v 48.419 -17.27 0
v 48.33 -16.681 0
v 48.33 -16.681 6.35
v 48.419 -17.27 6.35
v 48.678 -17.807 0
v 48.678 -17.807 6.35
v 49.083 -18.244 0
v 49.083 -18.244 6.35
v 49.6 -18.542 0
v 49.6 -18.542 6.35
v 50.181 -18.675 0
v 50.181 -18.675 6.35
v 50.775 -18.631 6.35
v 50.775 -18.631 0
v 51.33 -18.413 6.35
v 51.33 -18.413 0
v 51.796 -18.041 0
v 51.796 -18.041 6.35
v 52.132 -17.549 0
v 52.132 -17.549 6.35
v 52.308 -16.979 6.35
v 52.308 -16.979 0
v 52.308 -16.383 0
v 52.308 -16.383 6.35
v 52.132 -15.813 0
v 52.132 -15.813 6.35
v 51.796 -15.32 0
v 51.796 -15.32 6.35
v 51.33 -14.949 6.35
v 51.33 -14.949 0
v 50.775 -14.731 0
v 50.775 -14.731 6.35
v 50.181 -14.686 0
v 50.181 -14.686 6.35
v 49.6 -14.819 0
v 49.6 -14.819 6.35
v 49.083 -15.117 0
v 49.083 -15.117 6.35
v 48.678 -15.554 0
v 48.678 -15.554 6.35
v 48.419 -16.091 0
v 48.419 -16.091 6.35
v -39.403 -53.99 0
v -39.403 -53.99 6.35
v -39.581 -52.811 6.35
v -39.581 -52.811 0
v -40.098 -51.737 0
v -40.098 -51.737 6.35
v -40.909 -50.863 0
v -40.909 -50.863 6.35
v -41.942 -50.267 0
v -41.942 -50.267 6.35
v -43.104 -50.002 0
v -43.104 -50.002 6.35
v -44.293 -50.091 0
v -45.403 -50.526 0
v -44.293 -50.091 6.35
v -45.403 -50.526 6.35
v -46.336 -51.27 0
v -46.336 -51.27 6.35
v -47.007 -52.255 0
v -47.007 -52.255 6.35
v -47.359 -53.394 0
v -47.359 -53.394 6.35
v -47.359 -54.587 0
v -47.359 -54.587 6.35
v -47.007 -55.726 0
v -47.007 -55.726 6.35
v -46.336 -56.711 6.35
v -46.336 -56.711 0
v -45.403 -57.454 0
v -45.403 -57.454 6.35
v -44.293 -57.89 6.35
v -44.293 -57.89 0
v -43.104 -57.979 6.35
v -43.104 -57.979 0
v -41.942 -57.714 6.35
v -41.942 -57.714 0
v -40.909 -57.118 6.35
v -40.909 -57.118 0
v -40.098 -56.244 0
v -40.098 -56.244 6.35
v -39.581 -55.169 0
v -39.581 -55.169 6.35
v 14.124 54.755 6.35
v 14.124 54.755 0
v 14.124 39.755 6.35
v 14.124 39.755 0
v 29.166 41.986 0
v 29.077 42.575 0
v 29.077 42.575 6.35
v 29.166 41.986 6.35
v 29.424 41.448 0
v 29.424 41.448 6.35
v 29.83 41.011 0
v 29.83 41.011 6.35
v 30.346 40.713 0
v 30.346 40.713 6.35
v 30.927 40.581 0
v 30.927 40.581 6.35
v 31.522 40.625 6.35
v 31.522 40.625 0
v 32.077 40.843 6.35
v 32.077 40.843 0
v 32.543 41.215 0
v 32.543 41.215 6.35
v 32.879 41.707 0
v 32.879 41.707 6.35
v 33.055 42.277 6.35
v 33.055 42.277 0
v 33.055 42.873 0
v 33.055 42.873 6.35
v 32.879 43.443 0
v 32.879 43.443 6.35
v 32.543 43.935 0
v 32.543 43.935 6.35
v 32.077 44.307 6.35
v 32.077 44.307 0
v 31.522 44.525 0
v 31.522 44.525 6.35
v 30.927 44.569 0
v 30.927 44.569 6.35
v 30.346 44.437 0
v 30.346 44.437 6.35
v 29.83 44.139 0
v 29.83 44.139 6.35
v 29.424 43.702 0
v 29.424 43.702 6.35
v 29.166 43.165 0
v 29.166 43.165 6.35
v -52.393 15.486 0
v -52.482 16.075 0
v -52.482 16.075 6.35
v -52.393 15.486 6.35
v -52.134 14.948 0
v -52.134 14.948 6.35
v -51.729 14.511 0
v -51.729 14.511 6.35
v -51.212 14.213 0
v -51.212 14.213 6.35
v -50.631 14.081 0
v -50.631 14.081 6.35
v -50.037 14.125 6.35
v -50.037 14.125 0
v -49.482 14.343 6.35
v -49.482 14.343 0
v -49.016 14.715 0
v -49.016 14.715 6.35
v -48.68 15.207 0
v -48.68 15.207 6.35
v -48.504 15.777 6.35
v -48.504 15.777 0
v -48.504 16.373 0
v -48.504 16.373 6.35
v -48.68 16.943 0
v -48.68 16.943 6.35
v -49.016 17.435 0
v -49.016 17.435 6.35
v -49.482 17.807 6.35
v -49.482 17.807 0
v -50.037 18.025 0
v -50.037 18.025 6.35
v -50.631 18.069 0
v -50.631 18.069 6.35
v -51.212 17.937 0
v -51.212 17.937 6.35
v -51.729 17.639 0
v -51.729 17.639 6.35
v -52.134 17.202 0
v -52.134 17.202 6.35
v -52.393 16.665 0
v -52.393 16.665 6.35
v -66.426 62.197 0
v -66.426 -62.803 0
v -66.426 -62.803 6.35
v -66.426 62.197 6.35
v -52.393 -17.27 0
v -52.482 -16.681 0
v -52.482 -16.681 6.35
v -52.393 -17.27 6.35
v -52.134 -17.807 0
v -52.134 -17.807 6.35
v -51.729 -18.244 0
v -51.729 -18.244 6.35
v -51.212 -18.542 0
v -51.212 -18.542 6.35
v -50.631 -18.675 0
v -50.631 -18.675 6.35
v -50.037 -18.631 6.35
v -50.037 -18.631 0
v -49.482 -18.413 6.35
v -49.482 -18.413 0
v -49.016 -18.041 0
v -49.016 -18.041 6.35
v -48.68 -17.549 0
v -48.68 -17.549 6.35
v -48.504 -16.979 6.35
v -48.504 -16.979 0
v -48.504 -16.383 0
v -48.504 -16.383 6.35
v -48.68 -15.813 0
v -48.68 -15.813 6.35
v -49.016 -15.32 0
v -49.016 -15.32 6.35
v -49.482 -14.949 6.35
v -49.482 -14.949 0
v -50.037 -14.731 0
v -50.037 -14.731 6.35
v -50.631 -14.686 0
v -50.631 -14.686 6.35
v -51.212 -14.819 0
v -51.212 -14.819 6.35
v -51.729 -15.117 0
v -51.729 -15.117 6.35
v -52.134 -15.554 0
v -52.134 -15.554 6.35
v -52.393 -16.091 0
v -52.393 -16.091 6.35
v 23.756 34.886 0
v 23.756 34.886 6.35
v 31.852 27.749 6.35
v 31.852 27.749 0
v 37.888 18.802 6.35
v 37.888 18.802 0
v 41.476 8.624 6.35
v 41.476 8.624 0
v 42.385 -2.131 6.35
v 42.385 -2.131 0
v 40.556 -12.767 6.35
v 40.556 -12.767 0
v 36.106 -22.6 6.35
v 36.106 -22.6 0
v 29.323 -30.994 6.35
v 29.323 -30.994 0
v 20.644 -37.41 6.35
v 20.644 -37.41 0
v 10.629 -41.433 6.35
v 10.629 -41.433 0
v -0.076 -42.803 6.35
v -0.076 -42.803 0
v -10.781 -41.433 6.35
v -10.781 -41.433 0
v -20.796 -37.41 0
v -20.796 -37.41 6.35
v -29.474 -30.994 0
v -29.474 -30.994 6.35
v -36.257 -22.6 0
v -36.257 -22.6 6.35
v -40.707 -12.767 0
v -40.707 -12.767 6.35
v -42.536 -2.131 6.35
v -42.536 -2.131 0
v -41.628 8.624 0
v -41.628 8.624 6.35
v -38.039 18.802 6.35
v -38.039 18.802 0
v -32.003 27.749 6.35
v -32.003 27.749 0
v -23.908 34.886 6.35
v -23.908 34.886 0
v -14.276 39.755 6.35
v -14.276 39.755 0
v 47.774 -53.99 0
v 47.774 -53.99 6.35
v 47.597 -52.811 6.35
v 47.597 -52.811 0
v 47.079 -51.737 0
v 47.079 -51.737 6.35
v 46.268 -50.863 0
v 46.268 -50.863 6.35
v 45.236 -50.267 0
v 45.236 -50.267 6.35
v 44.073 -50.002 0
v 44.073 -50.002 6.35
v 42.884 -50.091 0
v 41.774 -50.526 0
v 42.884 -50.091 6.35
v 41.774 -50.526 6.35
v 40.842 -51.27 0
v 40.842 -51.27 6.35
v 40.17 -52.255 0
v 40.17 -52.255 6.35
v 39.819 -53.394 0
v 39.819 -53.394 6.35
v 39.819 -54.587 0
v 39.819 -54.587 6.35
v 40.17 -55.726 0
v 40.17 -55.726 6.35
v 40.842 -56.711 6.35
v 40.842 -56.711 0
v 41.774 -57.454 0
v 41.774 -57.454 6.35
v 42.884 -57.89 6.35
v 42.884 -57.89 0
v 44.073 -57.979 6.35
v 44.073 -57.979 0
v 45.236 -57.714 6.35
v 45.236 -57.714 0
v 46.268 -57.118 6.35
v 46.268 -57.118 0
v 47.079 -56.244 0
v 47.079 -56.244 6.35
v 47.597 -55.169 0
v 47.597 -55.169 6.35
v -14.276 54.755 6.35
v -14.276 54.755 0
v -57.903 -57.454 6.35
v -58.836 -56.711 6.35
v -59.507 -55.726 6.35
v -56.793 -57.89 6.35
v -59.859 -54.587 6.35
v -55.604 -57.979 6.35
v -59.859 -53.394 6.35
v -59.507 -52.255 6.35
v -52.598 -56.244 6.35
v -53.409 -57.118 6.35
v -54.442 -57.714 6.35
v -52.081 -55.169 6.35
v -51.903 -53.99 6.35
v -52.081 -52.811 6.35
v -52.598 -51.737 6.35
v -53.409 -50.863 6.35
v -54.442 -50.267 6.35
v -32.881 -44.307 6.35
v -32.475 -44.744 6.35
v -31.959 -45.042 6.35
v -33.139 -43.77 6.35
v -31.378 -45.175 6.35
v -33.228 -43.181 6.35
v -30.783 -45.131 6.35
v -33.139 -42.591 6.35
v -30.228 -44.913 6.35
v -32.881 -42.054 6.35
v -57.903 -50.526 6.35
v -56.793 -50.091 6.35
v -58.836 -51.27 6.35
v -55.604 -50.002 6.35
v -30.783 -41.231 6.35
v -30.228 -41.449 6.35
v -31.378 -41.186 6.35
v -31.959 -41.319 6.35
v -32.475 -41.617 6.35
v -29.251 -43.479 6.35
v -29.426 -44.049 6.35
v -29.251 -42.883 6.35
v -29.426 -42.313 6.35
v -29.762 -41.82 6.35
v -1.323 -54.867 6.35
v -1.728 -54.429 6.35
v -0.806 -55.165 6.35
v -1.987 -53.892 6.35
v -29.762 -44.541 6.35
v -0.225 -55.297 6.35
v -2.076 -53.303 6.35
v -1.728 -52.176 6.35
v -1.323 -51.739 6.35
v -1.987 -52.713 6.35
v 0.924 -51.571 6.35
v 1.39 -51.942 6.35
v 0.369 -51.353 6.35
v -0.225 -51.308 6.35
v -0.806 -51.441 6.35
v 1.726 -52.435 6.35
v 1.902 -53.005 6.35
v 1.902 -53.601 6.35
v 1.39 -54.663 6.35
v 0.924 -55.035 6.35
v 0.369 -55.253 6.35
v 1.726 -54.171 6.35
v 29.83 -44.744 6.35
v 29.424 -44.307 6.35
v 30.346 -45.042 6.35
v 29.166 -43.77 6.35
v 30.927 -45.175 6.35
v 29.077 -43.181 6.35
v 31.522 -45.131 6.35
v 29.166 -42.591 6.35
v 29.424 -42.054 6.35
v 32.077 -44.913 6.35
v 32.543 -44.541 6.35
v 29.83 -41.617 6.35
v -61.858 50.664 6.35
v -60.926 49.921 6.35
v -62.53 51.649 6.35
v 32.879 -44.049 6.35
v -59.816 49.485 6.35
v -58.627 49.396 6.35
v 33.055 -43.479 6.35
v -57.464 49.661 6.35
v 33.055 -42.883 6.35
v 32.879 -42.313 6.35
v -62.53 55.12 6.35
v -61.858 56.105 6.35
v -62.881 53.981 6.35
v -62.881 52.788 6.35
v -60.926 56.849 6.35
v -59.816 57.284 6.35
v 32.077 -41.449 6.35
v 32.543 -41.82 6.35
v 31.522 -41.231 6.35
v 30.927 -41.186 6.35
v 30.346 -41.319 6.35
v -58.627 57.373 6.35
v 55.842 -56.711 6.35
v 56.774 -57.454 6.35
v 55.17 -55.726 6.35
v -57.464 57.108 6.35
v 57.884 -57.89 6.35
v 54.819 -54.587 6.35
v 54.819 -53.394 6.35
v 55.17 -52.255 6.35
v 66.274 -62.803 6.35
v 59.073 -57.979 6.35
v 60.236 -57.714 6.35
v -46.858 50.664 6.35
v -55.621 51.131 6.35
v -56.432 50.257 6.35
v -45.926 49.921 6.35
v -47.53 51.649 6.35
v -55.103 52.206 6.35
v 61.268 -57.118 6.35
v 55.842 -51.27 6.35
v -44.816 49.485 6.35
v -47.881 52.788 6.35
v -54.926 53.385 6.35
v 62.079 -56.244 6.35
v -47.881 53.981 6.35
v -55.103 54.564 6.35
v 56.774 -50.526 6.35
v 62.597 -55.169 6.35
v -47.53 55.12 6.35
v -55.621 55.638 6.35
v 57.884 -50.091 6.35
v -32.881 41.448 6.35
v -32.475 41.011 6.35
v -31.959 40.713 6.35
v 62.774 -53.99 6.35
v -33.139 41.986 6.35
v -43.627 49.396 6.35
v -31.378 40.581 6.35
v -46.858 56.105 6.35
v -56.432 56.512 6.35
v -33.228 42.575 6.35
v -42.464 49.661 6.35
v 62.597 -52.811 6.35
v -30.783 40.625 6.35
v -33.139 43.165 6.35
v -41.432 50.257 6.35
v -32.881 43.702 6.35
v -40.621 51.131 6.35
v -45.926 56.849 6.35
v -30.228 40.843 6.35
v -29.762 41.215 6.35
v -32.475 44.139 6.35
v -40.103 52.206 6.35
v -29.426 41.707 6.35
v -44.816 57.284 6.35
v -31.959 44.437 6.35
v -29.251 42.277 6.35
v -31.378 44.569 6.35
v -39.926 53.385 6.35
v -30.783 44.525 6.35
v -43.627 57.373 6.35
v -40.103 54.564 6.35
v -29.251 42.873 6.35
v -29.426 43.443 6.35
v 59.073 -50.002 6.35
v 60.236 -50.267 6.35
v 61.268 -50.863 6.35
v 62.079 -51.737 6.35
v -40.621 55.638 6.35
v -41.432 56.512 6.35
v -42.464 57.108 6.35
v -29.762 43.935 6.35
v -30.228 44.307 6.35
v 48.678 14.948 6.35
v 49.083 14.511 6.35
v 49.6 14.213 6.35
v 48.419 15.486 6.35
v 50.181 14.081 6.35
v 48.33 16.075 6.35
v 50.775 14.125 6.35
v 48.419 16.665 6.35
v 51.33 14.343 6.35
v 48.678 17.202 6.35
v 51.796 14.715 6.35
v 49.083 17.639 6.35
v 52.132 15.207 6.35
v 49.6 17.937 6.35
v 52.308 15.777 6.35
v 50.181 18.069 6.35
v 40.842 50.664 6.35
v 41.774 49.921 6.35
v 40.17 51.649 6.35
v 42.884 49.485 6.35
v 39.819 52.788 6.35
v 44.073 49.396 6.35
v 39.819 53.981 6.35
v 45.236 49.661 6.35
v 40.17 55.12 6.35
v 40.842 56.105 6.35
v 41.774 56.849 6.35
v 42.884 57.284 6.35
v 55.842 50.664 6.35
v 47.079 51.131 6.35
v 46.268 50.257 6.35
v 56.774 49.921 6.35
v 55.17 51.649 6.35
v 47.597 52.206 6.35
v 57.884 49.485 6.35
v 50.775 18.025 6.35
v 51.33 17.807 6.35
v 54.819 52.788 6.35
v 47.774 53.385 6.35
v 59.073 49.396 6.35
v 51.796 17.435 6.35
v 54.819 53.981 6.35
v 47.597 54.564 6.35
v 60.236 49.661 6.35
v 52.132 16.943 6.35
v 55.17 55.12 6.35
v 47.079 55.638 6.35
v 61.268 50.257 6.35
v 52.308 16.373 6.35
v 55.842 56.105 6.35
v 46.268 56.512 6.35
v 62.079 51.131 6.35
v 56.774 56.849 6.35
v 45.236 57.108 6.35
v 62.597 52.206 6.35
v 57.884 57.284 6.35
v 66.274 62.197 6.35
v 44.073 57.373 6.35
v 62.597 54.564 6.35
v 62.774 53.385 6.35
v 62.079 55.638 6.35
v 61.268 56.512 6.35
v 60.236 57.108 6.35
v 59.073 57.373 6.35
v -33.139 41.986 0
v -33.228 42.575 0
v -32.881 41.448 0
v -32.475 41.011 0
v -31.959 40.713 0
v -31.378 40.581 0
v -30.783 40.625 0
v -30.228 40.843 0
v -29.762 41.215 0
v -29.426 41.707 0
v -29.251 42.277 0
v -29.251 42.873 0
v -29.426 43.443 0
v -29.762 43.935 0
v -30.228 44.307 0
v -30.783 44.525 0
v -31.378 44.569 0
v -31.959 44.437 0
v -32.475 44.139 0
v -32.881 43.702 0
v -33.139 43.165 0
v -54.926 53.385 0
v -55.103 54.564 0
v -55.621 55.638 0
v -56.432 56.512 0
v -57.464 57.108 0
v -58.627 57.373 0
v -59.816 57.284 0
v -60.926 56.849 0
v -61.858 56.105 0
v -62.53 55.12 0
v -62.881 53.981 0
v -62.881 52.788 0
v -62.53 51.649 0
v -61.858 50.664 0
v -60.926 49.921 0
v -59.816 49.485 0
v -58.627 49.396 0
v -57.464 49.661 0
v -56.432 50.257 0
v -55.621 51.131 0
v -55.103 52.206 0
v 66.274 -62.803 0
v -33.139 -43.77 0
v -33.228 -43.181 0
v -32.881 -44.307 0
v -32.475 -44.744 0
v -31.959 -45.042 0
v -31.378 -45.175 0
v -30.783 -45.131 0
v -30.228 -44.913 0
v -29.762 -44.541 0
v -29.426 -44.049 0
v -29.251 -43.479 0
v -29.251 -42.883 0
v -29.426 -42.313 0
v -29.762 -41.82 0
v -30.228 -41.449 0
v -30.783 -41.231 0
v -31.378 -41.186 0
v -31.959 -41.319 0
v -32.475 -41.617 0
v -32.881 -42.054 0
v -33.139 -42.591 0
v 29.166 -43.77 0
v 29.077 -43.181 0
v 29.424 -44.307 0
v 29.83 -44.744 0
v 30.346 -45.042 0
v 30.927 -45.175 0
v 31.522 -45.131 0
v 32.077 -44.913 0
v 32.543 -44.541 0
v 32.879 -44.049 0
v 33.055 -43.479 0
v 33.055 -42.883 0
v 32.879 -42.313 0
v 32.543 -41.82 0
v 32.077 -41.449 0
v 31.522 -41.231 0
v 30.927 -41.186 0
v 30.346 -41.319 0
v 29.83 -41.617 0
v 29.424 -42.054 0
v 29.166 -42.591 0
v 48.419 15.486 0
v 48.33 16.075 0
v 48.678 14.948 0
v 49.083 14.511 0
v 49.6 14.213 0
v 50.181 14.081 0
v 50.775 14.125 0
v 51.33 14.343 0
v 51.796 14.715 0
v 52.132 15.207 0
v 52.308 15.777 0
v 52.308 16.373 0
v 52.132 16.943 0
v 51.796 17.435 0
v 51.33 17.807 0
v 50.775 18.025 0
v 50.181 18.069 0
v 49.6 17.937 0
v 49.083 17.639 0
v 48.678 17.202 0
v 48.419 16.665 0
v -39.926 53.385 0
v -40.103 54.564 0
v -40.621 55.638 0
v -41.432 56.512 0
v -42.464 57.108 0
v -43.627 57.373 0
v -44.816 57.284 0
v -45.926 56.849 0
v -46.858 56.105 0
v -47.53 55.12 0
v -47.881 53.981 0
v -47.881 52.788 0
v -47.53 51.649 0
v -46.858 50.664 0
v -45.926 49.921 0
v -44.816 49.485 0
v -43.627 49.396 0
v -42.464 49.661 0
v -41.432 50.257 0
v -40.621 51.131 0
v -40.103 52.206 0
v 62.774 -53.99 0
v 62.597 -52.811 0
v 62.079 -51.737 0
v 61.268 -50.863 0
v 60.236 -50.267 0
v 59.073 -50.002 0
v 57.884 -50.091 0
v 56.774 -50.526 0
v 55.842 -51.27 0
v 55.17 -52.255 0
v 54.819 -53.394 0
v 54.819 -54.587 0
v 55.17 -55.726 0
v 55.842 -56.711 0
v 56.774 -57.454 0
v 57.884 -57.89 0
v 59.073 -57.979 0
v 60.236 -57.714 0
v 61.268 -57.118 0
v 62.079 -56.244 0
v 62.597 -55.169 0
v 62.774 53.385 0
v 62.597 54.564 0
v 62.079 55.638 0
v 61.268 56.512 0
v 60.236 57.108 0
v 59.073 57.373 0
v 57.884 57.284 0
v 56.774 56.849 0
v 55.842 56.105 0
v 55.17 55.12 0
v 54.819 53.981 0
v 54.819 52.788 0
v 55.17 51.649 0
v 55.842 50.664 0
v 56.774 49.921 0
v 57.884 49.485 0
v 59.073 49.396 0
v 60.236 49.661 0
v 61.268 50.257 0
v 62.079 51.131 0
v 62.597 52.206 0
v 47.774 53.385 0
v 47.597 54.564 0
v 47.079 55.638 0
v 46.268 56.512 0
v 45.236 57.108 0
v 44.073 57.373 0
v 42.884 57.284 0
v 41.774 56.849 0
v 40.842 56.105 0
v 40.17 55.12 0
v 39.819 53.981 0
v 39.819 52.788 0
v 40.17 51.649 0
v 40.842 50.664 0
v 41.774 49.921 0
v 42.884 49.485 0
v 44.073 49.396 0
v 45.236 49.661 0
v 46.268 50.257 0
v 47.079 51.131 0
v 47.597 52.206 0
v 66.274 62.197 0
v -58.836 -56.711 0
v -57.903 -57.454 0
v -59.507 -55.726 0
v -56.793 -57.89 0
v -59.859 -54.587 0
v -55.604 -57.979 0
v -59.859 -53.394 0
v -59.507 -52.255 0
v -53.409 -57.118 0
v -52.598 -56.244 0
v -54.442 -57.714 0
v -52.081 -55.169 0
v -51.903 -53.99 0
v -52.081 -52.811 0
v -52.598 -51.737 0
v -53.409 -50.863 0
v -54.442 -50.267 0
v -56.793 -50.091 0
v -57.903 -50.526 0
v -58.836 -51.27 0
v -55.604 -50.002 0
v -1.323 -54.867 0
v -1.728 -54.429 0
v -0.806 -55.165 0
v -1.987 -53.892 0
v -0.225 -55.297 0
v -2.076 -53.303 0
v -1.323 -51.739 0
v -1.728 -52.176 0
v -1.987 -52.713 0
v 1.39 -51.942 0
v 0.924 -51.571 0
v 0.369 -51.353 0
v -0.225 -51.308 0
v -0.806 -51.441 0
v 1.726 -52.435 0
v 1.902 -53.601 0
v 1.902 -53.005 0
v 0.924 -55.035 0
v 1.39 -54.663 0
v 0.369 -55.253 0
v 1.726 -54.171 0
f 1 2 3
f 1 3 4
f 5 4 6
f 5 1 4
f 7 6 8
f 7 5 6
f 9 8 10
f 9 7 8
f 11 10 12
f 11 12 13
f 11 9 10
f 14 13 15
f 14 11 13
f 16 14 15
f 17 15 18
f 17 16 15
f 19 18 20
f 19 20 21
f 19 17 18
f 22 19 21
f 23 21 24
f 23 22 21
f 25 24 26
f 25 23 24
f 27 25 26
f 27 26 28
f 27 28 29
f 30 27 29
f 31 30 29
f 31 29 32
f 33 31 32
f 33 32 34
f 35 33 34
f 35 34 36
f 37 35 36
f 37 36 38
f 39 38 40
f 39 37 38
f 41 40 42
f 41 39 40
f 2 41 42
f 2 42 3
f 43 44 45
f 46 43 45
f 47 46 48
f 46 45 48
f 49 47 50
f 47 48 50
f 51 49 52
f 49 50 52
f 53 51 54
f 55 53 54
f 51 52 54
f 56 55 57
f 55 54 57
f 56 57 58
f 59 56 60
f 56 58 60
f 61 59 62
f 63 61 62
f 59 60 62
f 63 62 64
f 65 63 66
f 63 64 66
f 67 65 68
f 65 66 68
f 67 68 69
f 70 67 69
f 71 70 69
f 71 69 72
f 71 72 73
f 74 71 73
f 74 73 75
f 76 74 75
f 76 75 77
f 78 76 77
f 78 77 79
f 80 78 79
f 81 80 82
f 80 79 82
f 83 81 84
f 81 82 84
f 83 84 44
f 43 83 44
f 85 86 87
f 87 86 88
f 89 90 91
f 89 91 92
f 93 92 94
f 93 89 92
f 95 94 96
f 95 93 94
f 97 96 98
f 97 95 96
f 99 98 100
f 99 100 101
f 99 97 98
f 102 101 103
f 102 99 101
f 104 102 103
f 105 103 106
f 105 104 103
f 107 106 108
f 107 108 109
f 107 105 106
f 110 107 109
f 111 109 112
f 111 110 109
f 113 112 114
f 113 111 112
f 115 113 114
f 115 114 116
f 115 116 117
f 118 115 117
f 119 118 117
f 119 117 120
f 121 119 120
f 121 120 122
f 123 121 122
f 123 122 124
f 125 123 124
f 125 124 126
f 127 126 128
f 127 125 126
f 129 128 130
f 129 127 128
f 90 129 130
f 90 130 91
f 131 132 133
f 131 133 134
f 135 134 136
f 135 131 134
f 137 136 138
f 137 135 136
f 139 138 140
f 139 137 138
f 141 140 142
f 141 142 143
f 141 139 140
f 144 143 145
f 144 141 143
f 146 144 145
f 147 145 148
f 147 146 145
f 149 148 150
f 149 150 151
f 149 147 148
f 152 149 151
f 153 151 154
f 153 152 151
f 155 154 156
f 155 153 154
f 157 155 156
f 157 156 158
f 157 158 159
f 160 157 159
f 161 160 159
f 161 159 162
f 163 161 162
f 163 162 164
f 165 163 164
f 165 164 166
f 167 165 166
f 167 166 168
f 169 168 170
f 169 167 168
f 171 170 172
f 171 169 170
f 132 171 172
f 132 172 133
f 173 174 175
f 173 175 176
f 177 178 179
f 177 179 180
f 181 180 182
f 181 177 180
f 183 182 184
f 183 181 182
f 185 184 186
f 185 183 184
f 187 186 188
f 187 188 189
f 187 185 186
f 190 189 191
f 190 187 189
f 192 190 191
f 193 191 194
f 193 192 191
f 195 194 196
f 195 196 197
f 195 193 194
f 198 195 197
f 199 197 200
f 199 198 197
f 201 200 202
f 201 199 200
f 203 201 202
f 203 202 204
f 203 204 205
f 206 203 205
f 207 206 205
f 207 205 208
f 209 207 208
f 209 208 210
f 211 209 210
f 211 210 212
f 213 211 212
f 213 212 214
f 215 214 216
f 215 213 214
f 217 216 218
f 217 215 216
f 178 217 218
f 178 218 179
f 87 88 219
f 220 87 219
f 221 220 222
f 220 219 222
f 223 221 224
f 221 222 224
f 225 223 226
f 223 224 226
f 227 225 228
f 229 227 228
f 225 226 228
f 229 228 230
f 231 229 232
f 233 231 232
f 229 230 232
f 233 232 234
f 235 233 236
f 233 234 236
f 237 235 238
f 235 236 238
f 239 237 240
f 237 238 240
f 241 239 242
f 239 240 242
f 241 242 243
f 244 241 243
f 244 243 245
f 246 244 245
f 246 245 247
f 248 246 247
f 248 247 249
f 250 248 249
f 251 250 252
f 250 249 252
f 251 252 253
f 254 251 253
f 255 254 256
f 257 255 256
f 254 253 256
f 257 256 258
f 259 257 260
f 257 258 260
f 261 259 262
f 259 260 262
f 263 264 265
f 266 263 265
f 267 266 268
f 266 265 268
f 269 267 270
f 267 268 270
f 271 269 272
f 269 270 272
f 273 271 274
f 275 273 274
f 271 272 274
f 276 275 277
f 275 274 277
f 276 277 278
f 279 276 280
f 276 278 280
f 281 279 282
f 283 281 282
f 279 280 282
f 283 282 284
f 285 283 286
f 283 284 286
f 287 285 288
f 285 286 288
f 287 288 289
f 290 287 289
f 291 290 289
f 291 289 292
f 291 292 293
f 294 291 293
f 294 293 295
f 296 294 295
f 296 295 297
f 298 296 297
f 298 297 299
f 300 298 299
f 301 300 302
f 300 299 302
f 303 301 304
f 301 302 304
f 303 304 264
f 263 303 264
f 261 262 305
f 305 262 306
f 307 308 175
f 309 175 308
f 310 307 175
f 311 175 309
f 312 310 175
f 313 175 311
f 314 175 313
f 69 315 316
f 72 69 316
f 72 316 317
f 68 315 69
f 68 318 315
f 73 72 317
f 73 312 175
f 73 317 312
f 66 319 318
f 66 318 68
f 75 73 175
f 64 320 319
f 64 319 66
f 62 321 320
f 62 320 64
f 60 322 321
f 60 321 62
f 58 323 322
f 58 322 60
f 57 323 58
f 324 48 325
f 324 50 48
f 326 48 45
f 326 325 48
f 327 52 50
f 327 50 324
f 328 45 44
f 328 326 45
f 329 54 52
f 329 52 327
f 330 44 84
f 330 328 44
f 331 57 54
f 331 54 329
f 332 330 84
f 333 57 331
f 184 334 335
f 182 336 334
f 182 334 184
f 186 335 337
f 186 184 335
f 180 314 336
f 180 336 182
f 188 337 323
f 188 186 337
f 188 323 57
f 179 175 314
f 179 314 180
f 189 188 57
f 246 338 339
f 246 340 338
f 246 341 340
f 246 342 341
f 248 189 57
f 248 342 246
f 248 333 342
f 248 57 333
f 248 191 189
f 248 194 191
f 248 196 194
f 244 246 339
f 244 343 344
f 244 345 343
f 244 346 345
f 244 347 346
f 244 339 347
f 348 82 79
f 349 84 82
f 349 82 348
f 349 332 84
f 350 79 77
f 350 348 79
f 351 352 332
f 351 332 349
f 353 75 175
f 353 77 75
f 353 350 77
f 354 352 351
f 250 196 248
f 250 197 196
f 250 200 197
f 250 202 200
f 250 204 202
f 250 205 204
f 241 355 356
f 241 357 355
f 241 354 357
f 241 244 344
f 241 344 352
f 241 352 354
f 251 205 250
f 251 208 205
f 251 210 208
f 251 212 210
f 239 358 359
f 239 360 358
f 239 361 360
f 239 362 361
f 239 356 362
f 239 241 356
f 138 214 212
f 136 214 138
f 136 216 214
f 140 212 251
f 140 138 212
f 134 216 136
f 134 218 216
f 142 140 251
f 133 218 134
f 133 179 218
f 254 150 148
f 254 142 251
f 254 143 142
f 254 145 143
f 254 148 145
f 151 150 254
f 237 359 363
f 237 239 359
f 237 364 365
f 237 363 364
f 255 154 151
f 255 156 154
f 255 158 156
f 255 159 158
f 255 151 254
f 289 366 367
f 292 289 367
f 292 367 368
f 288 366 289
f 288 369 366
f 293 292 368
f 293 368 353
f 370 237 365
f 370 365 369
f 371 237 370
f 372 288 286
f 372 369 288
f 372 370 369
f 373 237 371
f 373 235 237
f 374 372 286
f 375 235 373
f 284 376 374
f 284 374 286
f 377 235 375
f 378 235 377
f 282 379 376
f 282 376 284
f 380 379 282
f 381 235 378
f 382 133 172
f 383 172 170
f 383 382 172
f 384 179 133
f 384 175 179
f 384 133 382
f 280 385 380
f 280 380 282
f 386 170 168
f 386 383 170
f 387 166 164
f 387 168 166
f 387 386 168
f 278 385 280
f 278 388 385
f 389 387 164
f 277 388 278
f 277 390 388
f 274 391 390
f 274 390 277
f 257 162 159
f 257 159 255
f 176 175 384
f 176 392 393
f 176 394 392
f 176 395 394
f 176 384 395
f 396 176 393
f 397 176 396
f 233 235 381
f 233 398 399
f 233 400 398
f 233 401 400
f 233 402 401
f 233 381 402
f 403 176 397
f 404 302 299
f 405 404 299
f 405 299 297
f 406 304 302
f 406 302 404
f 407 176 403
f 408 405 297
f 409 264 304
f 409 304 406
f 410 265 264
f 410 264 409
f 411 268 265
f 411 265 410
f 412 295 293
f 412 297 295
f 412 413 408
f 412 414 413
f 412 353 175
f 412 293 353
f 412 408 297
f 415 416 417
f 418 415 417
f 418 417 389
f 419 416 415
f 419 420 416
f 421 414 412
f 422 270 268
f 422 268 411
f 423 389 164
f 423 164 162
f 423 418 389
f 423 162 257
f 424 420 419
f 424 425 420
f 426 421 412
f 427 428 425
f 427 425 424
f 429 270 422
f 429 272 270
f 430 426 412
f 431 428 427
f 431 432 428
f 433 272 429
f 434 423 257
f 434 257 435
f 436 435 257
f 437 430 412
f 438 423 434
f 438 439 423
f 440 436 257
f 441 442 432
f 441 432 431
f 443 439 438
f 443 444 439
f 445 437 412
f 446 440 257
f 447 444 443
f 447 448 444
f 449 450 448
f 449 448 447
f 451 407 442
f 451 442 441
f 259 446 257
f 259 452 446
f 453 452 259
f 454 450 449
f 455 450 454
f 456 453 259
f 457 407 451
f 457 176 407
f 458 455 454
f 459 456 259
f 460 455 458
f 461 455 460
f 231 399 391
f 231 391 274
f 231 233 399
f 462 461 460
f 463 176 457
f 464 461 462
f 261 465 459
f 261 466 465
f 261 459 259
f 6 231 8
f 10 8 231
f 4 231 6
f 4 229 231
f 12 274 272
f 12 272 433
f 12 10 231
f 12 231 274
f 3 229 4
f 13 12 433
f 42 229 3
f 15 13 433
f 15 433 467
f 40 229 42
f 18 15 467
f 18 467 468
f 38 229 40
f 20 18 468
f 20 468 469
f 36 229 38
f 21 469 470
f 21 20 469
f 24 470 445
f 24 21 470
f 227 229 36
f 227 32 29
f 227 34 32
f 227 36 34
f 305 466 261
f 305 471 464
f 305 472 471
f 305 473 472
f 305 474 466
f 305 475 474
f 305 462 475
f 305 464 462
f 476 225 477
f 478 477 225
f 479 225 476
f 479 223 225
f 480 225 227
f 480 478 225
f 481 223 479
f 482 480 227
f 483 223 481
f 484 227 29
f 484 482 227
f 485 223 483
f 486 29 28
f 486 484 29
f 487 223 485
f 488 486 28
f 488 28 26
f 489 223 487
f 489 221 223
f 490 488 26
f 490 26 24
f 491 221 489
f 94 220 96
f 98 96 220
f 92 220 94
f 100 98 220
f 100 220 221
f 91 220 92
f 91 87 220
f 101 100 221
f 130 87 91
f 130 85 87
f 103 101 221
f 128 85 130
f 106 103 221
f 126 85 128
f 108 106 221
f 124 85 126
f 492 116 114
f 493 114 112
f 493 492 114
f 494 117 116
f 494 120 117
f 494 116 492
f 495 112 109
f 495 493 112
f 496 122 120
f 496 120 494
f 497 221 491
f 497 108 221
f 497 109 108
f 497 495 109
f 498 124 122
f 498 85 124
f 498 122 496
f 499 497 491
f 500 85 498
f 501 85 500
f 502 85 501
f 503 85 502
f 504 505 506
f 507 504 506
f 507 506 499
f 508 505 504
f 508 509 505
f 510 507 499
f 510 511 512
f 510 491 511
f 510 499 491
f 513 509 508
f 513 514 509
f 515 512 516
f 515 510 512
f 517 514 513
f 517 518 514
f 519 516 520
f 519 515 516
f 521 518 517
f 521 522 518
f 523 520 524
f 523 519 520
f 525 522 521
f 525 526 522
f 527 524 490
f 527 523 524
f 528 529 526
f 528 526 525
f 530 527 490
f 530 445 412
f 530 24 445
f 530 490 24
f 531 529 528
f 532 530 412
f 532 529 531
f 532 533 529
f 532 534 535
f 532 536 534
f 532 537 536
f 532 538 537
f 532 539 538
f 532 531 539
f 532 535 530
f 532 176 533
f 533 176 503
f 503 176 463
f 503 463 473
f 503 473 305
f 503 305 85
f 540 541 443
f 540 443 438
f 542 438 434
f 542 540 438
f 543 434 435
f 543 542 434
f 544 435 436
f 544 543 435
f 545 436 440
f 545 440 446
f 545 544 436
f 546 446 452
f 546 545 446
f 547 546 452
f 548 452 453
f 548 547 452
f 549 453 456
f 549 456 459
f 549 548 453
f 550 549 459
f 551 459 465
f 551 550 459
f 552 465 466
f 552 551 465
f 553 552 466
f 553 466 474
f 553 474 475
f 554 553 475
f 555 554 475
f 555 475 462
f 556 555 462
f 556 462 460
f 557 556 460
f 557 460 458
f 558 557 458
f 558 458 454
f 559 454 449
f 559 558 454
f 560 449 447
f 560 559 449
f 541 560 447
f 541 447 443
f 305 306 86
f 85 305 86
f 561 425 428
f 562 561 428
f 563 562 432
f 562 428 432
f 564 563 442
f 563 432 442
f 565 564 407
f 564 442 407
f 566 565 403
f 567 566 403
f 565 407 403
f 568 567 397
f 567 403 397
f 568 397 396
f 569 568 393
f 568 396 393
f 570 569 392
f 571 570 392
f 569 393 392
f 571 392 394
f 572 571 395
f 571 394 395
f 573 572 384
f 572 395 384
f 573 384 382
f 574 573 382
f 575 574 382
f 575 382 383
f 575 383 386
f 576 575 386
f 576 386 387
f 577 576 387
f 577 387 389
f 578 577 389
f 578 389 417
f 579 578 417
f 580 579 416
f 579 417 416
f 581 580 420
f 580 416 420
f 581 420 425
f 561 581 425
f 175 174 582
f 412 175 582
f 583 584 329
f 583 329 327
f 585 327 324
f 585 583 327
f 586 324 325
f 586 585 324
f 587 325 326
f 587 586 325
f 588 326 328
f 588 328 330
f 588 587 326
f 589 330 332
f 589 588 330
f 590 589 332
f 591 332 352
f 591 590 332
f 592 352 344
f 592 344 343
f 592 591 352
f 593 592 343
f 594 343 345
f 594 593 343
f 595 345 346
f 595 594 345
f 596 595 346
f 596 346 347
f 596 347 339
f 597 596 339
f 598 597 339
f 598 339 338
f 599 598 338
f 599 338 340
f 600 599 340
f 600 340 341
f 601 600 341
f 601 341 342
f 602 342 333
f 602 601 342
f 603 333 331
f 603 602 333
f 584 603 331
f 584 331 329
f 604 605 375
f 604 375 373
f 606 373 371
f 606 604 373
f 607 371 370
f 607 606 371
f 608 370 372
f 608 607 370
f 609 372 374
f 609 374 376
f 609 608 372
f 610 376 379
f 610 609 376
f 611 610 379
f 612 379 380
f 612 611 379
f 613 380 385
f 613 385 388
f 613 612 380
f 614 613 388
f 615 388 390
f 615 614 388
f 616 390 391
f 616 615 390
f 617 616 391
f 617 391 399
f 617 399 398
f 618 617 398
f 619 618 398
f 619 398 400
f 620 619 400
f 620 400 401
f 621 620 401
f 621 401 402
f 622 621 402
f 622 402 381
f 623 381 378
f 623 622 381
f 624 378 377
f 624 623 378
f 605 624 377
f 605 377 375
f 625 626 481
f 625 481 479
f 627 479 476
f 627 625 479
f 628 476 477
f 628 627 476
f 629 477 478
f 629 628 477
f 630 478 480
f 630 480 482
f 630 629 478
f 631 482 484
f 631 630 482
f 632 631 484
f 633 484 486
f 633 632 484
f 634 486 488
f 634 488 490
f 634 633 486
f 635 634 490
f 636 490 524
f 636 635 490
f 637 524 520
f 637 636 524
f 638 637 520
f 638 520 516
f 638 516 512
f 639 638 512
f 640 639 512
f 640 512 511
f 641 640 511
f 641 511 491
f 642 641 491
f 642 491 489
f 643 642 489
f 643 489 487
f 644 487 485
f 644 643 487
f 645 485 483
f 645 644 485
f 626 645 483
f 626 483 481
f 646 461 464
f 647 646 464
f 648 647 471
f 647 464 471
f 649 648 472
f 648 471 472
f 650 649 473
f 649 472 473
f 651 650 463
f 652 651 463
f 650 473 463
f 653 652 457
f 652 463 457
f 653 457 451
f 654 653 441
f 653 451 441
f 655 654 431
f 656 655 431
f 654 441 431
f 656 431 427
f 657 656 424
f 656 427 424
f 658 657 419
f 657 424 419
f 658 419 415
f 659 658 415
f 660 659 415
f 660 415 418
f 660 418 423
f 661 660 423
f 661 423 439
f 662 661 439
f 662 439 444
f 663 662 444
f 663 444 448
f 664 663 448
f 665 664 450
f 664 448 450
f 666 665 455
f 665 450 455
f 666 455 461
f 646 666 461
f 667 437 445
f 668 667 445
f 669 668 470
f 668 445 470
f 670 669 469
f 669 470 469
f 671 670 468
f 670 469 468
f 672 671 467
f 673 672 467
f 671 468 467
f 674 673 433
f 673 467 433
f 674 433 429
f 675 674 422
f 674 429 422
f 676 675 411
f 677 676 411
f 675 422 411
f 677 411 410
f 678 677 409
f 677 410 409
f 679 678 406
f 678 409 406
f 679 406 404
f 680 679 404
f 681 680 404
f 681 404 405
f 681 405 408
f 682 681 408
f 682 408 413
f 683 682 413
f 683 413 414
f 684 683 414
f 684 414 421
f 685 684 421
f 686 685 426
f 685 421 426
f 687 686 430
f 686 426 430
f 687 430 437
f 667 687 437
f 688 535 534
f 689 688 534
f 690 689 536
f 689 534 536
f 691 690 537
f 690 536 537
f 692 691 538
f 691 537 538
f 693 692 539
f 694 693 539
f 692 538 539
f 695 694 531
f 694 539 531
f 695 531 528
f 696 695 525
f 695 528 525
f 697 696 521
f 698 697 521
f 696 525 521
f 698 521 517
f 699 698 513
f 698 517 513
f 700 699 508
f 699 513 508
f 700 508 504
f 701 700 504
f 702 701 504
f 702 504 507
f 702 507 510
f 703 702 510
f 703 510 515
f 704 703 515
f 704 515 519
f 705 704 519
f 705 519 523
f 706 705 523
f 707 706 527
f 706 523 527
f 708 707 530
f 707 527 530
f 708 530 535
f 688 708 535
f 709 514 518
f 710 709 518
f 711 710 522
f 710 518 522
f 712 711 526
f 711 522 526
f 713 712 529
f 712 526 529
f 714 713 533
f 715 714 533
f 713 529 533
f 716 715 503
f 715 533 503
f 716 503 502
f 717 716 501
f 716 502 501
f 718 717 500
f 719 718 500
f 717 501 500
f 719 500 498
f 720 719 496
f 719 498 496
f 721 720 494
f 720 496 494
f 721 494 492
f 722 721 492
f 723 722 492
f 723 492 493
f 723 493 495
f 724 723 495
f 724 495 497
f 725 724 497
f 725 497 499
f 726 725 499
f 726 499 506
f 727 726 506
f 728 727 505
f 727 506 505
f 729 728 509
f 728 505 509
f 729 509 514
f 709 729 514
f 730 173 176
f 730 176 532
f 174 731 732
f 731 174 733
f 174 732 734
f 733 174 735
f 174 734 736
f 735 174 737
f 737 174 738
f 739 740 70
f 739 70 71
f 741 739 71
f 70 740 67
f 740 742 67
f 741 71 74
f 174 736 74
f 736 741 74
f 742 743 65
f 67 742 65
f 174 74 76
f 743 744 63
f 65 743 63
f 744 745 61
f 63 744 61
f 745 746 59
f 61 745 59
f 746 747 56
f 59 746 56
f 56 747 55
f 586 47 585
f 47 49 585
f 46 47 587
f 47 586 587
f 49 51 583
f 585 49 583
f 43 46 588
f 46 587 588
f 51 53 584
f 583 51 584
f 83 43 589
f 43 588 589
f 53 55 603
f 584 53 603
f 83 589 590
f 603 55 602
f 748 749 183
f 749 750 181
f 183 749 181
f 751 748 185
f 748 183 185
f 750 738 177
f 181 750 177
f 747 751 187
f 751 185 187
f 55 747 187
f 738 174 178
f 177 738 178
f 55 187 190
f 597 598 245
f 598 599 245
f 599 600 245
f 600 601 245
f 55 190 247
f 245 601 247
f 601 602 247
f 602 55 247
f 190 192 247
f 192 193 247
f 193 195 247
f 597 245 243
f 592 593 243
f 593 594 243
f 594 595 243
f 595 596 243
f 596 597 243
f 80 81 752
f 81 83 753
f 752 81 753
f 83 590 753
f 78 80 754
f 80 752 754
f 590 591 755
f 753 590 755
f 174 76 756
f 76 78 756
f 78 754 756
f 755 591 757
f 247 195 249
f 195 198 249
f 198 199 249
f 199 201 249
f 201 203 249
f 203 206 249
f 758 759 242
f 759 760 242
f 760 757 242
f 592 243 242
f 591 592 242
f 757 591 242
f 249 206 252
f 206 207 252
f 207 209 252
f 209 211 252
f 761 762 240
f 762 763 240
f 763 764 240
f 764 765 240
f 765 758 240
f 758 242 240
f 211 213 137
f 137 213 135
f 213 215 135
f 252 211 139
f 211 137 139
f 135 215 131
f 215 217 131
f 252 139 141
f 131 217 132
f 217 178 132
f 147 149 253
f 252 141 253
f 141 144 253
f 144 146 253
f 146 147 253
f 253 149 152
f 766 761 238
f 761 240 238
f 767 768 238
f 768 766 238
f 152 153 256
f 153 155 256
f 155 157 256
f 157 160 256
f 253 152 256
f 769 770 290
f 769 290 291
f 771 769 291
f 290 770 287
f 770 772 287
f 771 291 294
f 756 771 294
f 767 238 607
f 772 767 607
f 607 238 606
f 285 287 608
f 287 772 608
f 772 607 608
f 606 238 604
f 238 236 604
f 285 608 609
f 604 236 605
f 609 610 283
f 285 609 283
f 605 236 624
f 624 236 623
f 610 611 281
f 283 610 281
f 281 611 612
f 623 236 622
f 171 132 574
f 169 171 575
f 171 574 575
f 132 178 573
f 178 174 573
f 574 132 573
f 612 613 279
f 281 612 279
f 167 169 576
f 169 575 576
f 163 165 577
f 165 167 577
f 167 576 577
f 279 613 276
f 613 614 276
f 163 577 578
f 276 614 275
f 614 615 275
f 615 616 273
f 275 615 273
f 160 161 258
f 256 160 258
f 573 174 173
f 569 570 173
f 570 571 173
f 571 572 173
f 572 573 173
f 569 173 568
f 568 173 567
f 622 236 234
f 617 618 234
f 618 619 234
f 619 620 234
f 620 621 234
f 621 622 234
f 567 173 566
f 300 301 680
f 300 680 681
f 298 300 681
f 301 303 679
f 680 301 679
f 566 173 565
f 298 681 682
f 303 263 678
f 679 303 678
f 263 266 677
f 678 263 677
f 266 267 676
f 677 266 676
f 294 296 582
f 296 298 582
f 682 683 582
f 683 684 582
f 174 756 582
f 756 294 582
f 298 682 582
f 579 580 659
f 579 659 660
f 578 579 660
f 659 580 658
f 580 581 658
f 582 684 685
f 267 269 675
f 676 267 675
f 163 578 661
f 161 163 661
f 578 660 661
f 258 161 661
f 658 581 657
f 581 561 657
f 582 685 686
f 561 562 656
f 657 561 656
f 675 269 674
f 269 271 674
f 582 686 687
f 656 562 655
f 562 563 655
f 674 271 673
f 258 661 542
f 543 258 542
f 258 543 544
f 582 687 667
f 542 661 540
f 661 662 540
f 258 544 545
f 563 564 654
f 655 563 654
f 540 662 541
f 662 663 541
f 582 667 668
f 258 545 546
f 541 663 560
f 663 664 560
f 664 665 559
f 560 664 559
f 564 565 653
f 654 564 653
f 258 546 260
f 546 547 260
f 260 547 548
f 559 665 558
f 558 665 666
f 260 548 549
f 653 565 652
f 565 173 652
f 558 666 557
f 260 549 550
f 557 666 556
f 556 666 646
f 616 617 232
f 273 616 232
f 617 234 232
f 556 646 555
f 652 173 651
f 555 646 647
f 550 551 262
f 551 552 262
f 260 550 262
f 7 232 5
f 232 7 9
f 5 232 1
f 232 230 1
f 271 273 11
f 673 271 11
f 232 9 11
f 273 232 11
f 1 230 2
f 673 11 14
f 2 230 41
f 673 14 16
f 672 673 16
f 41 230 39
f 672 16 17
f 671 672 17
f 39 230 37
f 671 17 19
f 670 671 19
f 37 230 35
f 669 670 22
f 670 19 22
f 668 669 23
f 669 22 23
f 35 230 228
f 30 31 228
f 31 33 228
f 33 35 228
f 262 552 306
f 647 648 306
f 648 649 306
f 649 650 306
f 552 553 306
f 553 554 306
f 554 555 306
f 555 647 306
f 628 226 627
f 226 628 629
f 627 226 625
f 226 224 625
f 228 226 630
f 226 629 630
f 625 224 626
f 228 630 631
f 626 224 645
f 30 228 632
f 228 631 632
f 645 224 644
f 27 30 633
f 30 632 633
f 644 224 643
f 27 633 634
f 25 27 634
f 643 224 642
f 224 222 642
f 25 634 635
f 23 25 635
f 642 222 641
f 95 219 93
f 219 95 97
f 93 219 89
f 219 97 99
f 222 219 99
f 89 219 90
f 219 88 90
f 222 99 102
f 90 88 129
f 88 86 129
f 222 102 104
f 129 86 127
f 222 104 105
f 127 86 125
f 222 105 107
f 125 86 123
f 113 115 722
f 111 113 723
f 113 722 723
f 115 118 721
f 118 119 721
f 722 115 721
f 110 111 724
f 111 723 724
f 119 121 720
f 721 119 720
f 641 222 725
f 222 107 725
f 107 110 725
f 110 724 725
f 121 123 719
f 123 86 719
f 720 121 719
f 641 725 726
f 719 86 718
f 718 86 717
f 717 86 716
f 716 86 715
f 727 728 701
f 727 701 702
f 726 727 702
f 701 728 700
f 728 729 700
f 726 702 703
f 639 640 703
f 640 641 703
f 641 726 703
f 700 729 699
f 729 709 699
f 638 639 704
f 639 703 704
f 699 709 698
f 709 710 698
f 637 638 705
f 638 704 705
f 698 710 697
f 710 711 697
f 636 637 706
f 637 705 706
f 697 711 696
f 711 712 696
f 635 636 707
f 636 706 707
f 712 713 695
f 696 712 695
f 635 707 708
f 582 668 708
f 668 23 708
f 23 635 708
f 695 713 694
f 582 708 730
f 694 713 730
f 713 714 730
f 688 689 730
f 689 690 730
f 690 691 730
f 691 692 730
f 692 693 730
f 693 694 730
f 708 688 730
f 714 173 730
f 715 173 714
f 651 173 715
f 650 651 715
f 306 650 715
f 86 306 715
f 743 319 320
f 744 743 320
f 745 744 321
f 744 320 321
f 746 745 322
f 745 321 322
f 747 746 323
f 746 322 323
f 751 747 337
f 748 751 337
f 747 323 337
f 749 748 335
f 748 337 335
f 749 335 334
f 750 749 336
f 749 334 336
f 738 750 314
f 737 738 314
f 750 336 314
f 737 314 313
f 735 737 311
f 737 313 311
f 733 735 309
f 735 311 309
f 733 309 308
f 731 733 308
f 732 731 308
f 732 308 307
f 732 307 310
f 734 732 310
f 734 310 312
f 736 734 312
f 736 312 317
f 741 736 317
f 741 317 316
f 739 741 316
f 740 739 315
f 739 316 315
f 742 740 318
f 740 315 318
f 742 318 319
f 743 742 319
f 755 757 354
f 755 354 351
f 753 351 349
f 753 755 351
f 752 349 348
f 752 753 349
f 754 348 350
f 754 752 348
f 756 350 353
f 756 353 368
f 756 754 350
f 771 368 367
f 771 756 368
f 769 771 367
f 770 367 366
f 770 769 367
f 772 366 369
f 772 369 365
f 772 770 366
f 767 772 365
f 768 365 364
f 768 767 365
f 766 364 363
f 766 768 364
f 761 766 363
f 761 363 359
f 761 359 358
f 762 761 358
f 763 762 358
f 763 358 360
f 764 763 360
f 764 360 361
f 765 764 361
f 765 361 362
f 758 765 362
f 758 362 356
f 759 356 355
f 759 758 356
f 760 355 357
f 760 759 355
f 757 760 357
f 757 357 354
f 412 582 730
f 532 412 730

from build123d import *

# Parameters (mm, degrees)
SKETCH2_W           = 132.7
SKETCH2_H           = 125
BOSS_EXTRUDE1_DEPTH = 6.35
SKETCH1_R           = 2
CUT_EXTRUDE1_DEPTH  = 6.35
SKETCH6_R           = 4
CUT_EXTRUDE3_DEPTH  = 6.35


with BuildPart() as part:
    # Sketch2 → Boss-Extrude1 (new body)
    with BuildSketch(Plane.XY):
        with Locations((-0.075710713, -0.302842853)):
            Rectangle(SKETCH2_W, SKETCH2_H)
    extrude(amount=BOSS_EXTRUDE1_DEPTH)

    # Sketch1 → Cut-Extrude1 (cut)
    with BuildSketch(Plane.XY):
        with Locations(Location((-50.481706077, 16.075057848, 0), (0, 0, 180))):
            Circle(SKETCH1_R)
        with Locations(Location((-50.481706077, -16.680743555, 0), (0, 0, 180))):
            Circle(SKETCH1_R)
        with Locations(Location((-31.228329085, -43.180743555, 0), (0, 0, 180))):
            Circle(SKETCH1_R)
        with Locations(Location((-0.075710713, -53.302842853, 0), (0, 0, 180))):
            Circle(SKETCH1_R)
        with Locations(Location((31.076907658, -43.180743555, 0), (0, 0, 180))):
            Circle(SKETCH1_R)
        with Locations(Location((50.33028465, -16.680743555, 0), (0, 0, 180))):
            Circle(SKETCH1_R)
        with Locations(Location((50.33028465, 16.075057848, 0), (0, 0, 180))):
            Circle(SKETCH1_R)
        with Locations(Location((31.076907658, 42.575057848, 0), (0, 0, 180))):
            Circle(SKETCH1_R)
        with Locations(Location((-31.228329085, 42.575057848, 0), (0, 0, 180))):
            Circle(SKETCH1_R)
        with BuildLine():
            Line((-14.275710713, 39.754740698), (-14.275710713, 54.754740698))
            Line((-14.275710713, 54.754740698), (14.124289287, 54.754740698))
            Line((14.124289287, 54.754740698), (14.124289287, 39.754740698))
            ThreePointArc((14.124289287, 39.754740698), (-0.075710713, -42.802842853), (-14.275710713, 39.754740698))
        make_face()
    extrude(amount=CUT_EXTRUDE1_DEPTH, mode=Mode.SUBTRACT)

    # Sketch6 → Cut-Extrude3 (cut)
    with BuildSketch(Plane.XY.offset(6.35)):
        with Locations((58.774289287, -53.990342854)):
            Circle(SKETCH6_R)
        with Locations((43.774289287, -53.990342854)):
            Circle(SKETCH6_R)
        with Locations((-55.903321393, -53.990342853)):
            Circle(SKETCH6_R)
        with Locations((-43.403321393, -53.990342853)):
            Circle(SKETCH6_R)
        with Locations((-58.925710713, 53.384657146)):
            Circle(SKETCH6_R)
        with Locations((-43.925710713, 53.384657146)):
            Circle(SKETCH6_R)
        with Locations((43.774289287, 53.384657147)):
            Circle(SKETCH6_R)
        with Locations((58.774289287, 53.384657147)):
            Circle(SKETCH6_R)
    extrude(amount=-CUT_EXTRUDE3_DEPTH, mode=Mode.SUBTRACT)


solid = part.part
